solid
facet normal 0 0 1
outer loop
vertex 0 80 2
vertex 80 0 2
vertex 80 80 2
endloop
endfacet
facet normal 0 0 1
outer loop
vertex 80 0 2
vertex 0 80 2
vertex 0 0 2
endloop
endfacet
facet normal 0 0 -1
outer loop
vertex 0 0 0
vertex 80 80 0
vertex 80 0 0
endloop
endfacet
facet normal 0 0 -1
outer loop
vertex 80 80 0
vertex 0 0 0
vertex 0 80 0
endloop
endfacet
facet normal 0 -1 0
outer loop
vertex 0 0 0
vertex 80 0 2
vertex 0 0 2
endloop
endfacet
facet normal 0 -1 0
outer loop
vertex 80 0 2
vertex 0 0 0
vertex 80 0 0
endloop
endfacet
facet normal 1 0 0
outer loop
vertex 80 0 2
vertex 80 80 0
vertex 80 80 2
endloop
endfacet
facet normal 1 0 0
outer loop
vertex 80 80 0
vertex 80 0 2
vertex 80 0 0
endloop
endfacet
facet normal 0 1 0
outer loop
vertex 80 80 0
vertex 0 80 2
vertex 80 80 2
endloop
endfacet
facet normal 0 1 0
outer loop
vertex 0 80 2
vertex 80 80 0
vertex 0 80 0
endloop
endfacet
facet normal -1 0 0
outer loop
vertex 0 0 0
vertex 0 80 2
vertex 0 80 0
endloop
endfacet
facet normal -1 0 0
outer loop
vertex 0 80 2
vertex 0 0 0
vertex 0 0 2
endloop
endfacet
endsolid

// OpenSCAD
// file: ../common/ciy_logo.scad
ciy_logo(logo_size = 10, logo_height = 5);

module ciy_logo(logo_size = 5, logo_height) {
    scale ([logo_size/5, logo_size/5 , 1]) {
        linear_extrude(height= logo_height, center = false){
            translate([-3,0,0]){
                text("C", halign = "center", valign = "center", size = 4.5, $fn = 40);
            }
            translate([-0.1, -0.2,0]){
                rotate([0,0,-25]){
                    text("i", halign = "center", valign = "center", size = 4.5);
                }
            }
            translate([2,0,0]){
                rotate([0,0,11]){
                    text("Y", halign = "center", valign = "center", size = 5);
                }
            }
            translate([1,1.9,0]){
                circle(0.6,$fn=20);
            }
        }
    }
}
// file: ../common/cutterize.scad
// With a lot of thanks to Cube Hero !!! He saved my day.
// https://cubehero.com/2013/12/31/creating-cookie-cutters-using-offsets-in-openscad/

translate ([-20,2,0])square(40);
color("white") offset(r = -10) translate ([-80,-80,0]) square(40);
color("blue") fillet(10) translate ([-40,-40,0]) square(40);
color("red") chamfer(10) translate ([0,-40,0]) square(40);

color("green") cutterize_2d_fillet(2) 
  translate ([-62,2,0]) square(40);
color("green") cutterize_2d_chamfer(2) 
  translate ([22,2,0]) square(40);
  
color("purple") cutterize_3d_fillet(2, 20) 
  translate ([-62,46,0]) square(40);
color("purple") cutterize_3d_chamfer(2, 20) 
  translate ([22,46,0]) square(40);
  
color("pink") cutterize_3d_offset (thickness = 1, height = 20)  
  translate ([-20,90,0]) square(40);
  
module fillet(r) {
   offset(r = r) {
     offset(r = -r) {
       children();
     }
   }
 }

module chamfer(r) {
   offset(delta = r, chamfer = true) {
     offset(r = -r) {
       children();
     }
   }
 }

module cutterize_2d_fillet (thickness = 1) {
  difference () {
    offset(r = thickness) fillet(thickness) children();
    fillet(thickness) children();
  }
} 

module cutterize_2d_chamfer (thickness = 1) {
  difference () {
    offset(delta = thickness, chamfer = true) chamfer(thickness) children();
    chamfer(thickness) children();
  }
} 

module cutterize_2d_offset (thickness = 1) {
  difference () {
    offset(delta = thickness, chamfer = false) children();
    children();
  }
} 

module cutterize_3d_fillet (thickness = 1, height = 10) {
  linear_extrude(height) cutterize_2d_fillet(thickness) children();
} 

module cutterize_3d_chamfer (thickness = 1, height = 10) {
  linear_extrude(height) cutterize_2d_chamfer(thickness) children();
} 

module cutterize_3d_offset (thickness = 1, height = 10) {
  linear_extrude(height) cutterize_2d_offset(thickness) children();
} 

module cutterize_offset (thickness = 1) {
  difference() {
    render() {
      minkowski() {
        children();
        cube([2 * thickness, 2 * thickness, 2 * thickness], center=true);
      }
    }
    translate([0, 0, -5 * thickness]) scale([1, 1, 100])
      children();
  }
}

module cutterize_2d_offset_min (thickness = 1) {
  difference() {
    render() {
      minkowski() {
        children();
        square([2 * thickness, 2 * thickness, 2 * thickness], center=true);
      }
    }
    translate([0, 0, -5 * thickness]) scale([1, 1, 100])
      children();
  }
}

module cutterize_3d_offset_min (thickness = 1, height = 10) {
  difference() {
    render() {
      minkowski() {
        linear_extrude(height) children();
        cube([2 * thickness, 2 * thickness, 2 * thickness], center=true);
      }
    }
    translate([0, 0, -5 * thickness]) scale([1, 1, 100])
      linear_extrude(height) children();
  }
}


module cutterize_offset_round (thickness = 1) {
  difference() {
    render() {
      minkowski() {
        children();
        cylinder(d=2*thickness, h=2*thickness, center=true);
      }
    }
    translate([0, 0, -5*thickness]) scale([1, 1, 100])
      children();
  }
}

module inset_shell(thickness = 0.5, bbox = [5000, 5000, 5000]) {
  module invert(bbox = [5000, 5000, 5000]) {
    difference() {
      cube(bbox, true);
      children();
    }        
  }

  module inset(thickness = 0.5, bbox = [5000, 5000, 5000]) {
    render() {
      invert(0.9 * bbox)
        minkowski() {
          invert() children();
          cube([2 * thickness, 2 * thickness, 2 * thickness], center=true);
        }
    }
  }

  render() {
    difference() {
      children();
      translate([0, 0, -5 * thickness]) scale([1, 1, 100]) translate([0, 0, -2 * thickness])
        inset(thickness, bbox)
          children();
    }
  }
}

module inset_shell_round(thickness = 0.5, bbox = [5000, 5000, 5000]) {
  module invert(bbox = [5000, 5000, 5000]) {
    difference() {
      cube(bbox, true);
      children();
    }        
  }

  module inset(thickness = 0.5, bbox = [5000, 5000, 5000]) {
    render() {
      invert(0.9 * bbox)
        minkowski() {
          invert() children();
          cylinder(d=2*thickness, h=2*thickness, center=true);
        }
    }
  }

  render() {
    difference() {
      children();
      translate([0, 0, -5 * thickness]) scale([1, 1, 100]) translate([0, 0, -2 * thickness])
        inset(thickness, bbox)
          children();
    }
  }
}
// file: ../common/molderize.scad
// ************************************************************
// * EN
// * This model is gracefully offered by cookityourself.
// * Feel free to do what you want with it.
// * Please just add a link to our website www.ciy.fr 
// * if you use some of our code in your own creations.
// ************************************************************
// * FR
// * Ce modèle vous est gracieusement offert par cookityourself.
// * Vous êtes libres de l'utiliser comme bon vous semble.
// * Nous vous demandons seulement de faire un lien vers notre 
// * site web www.ciy.fr si vous utilisez tout ou partie de ce 
// * code pour l'une de vos créations.
// ************************************************************
// Generic functions to transform a 2D image file into a positive
// to make a mold of the same shape.
// ************************************************************


preview();

module preview () {
  file = "../meeples/meeple.dxf";
  height = 40;
  chamfer = 2;
  radius = 5;
  steps = 20;

  module shape () {
     import(file);
  }

  color("blue") translate([-200,0,0]) molderize (height) shape ();
  color("red") translate([-200,-200,0]) molderize_n_chamfer (height, chamfer) shape ();
  molderize_n_fillet (height, radius, steps) shape ();
}


function filletDepth(radius, step_height, step) = radius * cos(asin(step_height * step / radius));

module molderize (height) {
  linear_extrude(height) children();
}

module molderize_n_chamfer (height, chamfer, steps) {
  linear_extrude(height-chamfer) children();
  d= chamfer/steps;
  for (i = [0:steps]) {
      x = -d * i;
      z = d * i;                  
      translate([0, 0, height-chamfer + z]) 
        linear_extrude(d) 
          offset(delta = x) children();
    //echo (i, x, z);
  }
}

module molderize_n_fillet (height, radius, steps) {

  linear_extrude(height-radius) children();
  d= radius/steps;
  for (i = [0:steps]) {
      x = filletDepth(radius, d, i);
      z = d * i;                  
      delta = -radius + x;
      translate([0, 0, height-radius + z]) 
        linear_extrude(d) 
          offset(delta = delta) children();
    //echo (i, d, x, z, delta);
  }
}
// main file
// ************************************************************
// * EN
// * This model is offered free of charge by cookityourself.
// * Feel free to do what you want with it.
// * Please just add a link to our website www.ciy.fr 
// * if you use some of our code in your own creations.
// ************************************************************
// * FR
// * Ce modèle vous est gracieusement offert par cookityourself.
// * Vous êtes libres de l'utiliser comme bon vous semble.
// * Nous vous demandons seulement de faire un lien vers notre 
// * site web www.ciy.fr si vous utilisez tout ou partie de ce 
// * code pour l'une de vos créations.
// ************************************************************
// Model to create the positive of a mold for a meeple fairy cake
// Choose the name of the part you want to export to create
// the files to slice and print.
// ************************************************************

use <../common/molderize.scad>
use <../common/cutterize.scad>
use <../common/ciy_logo.scad>

scale([1,1,1]){
  // !!!!!!!!!!!!!!!!!!!!!!!!!!!!!!!!!!!!!!!!!!!!!!!!!!!!!!!!!!
  
  // Choose here what you want to export:

  export = "fairy_wand_in"; 

  // "all" : not designed for printing, final view of all the parts
  // "fairy_simple"      : a fairy with a rectangular support
  // "fairy_wand_out" : a fairy with a magic wand on it
  // "fairy_wand_in"    : a fairy with a magic wand in it
  
  //----------------------------------------------------------
  
  $fn = 1000;
  //$fn = 30; // debug
  
  thickness = 2;
  mold_width = 80;
  
  fairy_h = 25;
  wand_h = 2;
  rounding_factor = 0.2;
  fillets_s = 30; // fillet steps (see library)
  scaling = 0.14;

  fairy_height = fairy_h+thickness;
  wand_height = wand_h;

  //----------------------------------------------------------

  if (export == "fairy_simple") {
    translate ([-5,35,0]) rotate([0,0,-45]) 
    scale([scaling,scaling,1]) {
      fairy(fairy_height, rounding_factor, fillets_s);
    }
    translate([0,0,0]) color("purple")cube([80,80, thickness], center = false);
    
  }
 
  else if (export == "fairy_wand_out") {
    translate ([-5,35,0]) rotate([0,0,-45]) 
    scale([scaling,scaling,1]) {
      fairy(fairy_height, rounding_factor, fillets_s);
      translate([0,0,fairy_height]) magic_wand(wand_height, rounding_factor*4, fillets_s);
    }
    translate([0,0,0]) color("purple")cube([80,80, thickness], center = false);
  }
 
   else if (export == "fairy_wand_in") {
    translate ([-5,35,0]) rotate([0,0,-45]) 
    scale([scaling,scaling,1]) {
      difference () {
        fairy(fairy_height, rounding_factor, fillets_s);
        mirror([0,0,1]) translate([0,0,-fairy_height-1]) magic_wand(wand_height+1, rounding_factor*4, fillets_s);
      }
    }
    translate([0,0,0]) color("purple")cube([80,80, thickness], center = false);    
  }

 else {
    $fn = 30;
  }

}

// ************************************************************
// ************************************************************
// * Submodules
// ************************************************************
// ************************************************************

module fairy_shape(){
  import(file = "meeple_fairy.dxf");
}

module fairy(fairy_height, rounding_factor, fillets_s){
  color("lightpink") molderize_n_fillet(height =fairy_height, radius=fairy_height*rounding_factor, steps=fillets_s) fairy_shape();
}

module magic_wand_shape(){
  import(file = "meeple_fairy_magic_wand.dxf");
}

module magic_wand(wand_height, rounding_factor, fillets_s){
  color("gold") molderize_n_fillet(height =wand_height, radius=wand_height*rounding_factor, steps=fillets_s) magic_wand_shape();
}
